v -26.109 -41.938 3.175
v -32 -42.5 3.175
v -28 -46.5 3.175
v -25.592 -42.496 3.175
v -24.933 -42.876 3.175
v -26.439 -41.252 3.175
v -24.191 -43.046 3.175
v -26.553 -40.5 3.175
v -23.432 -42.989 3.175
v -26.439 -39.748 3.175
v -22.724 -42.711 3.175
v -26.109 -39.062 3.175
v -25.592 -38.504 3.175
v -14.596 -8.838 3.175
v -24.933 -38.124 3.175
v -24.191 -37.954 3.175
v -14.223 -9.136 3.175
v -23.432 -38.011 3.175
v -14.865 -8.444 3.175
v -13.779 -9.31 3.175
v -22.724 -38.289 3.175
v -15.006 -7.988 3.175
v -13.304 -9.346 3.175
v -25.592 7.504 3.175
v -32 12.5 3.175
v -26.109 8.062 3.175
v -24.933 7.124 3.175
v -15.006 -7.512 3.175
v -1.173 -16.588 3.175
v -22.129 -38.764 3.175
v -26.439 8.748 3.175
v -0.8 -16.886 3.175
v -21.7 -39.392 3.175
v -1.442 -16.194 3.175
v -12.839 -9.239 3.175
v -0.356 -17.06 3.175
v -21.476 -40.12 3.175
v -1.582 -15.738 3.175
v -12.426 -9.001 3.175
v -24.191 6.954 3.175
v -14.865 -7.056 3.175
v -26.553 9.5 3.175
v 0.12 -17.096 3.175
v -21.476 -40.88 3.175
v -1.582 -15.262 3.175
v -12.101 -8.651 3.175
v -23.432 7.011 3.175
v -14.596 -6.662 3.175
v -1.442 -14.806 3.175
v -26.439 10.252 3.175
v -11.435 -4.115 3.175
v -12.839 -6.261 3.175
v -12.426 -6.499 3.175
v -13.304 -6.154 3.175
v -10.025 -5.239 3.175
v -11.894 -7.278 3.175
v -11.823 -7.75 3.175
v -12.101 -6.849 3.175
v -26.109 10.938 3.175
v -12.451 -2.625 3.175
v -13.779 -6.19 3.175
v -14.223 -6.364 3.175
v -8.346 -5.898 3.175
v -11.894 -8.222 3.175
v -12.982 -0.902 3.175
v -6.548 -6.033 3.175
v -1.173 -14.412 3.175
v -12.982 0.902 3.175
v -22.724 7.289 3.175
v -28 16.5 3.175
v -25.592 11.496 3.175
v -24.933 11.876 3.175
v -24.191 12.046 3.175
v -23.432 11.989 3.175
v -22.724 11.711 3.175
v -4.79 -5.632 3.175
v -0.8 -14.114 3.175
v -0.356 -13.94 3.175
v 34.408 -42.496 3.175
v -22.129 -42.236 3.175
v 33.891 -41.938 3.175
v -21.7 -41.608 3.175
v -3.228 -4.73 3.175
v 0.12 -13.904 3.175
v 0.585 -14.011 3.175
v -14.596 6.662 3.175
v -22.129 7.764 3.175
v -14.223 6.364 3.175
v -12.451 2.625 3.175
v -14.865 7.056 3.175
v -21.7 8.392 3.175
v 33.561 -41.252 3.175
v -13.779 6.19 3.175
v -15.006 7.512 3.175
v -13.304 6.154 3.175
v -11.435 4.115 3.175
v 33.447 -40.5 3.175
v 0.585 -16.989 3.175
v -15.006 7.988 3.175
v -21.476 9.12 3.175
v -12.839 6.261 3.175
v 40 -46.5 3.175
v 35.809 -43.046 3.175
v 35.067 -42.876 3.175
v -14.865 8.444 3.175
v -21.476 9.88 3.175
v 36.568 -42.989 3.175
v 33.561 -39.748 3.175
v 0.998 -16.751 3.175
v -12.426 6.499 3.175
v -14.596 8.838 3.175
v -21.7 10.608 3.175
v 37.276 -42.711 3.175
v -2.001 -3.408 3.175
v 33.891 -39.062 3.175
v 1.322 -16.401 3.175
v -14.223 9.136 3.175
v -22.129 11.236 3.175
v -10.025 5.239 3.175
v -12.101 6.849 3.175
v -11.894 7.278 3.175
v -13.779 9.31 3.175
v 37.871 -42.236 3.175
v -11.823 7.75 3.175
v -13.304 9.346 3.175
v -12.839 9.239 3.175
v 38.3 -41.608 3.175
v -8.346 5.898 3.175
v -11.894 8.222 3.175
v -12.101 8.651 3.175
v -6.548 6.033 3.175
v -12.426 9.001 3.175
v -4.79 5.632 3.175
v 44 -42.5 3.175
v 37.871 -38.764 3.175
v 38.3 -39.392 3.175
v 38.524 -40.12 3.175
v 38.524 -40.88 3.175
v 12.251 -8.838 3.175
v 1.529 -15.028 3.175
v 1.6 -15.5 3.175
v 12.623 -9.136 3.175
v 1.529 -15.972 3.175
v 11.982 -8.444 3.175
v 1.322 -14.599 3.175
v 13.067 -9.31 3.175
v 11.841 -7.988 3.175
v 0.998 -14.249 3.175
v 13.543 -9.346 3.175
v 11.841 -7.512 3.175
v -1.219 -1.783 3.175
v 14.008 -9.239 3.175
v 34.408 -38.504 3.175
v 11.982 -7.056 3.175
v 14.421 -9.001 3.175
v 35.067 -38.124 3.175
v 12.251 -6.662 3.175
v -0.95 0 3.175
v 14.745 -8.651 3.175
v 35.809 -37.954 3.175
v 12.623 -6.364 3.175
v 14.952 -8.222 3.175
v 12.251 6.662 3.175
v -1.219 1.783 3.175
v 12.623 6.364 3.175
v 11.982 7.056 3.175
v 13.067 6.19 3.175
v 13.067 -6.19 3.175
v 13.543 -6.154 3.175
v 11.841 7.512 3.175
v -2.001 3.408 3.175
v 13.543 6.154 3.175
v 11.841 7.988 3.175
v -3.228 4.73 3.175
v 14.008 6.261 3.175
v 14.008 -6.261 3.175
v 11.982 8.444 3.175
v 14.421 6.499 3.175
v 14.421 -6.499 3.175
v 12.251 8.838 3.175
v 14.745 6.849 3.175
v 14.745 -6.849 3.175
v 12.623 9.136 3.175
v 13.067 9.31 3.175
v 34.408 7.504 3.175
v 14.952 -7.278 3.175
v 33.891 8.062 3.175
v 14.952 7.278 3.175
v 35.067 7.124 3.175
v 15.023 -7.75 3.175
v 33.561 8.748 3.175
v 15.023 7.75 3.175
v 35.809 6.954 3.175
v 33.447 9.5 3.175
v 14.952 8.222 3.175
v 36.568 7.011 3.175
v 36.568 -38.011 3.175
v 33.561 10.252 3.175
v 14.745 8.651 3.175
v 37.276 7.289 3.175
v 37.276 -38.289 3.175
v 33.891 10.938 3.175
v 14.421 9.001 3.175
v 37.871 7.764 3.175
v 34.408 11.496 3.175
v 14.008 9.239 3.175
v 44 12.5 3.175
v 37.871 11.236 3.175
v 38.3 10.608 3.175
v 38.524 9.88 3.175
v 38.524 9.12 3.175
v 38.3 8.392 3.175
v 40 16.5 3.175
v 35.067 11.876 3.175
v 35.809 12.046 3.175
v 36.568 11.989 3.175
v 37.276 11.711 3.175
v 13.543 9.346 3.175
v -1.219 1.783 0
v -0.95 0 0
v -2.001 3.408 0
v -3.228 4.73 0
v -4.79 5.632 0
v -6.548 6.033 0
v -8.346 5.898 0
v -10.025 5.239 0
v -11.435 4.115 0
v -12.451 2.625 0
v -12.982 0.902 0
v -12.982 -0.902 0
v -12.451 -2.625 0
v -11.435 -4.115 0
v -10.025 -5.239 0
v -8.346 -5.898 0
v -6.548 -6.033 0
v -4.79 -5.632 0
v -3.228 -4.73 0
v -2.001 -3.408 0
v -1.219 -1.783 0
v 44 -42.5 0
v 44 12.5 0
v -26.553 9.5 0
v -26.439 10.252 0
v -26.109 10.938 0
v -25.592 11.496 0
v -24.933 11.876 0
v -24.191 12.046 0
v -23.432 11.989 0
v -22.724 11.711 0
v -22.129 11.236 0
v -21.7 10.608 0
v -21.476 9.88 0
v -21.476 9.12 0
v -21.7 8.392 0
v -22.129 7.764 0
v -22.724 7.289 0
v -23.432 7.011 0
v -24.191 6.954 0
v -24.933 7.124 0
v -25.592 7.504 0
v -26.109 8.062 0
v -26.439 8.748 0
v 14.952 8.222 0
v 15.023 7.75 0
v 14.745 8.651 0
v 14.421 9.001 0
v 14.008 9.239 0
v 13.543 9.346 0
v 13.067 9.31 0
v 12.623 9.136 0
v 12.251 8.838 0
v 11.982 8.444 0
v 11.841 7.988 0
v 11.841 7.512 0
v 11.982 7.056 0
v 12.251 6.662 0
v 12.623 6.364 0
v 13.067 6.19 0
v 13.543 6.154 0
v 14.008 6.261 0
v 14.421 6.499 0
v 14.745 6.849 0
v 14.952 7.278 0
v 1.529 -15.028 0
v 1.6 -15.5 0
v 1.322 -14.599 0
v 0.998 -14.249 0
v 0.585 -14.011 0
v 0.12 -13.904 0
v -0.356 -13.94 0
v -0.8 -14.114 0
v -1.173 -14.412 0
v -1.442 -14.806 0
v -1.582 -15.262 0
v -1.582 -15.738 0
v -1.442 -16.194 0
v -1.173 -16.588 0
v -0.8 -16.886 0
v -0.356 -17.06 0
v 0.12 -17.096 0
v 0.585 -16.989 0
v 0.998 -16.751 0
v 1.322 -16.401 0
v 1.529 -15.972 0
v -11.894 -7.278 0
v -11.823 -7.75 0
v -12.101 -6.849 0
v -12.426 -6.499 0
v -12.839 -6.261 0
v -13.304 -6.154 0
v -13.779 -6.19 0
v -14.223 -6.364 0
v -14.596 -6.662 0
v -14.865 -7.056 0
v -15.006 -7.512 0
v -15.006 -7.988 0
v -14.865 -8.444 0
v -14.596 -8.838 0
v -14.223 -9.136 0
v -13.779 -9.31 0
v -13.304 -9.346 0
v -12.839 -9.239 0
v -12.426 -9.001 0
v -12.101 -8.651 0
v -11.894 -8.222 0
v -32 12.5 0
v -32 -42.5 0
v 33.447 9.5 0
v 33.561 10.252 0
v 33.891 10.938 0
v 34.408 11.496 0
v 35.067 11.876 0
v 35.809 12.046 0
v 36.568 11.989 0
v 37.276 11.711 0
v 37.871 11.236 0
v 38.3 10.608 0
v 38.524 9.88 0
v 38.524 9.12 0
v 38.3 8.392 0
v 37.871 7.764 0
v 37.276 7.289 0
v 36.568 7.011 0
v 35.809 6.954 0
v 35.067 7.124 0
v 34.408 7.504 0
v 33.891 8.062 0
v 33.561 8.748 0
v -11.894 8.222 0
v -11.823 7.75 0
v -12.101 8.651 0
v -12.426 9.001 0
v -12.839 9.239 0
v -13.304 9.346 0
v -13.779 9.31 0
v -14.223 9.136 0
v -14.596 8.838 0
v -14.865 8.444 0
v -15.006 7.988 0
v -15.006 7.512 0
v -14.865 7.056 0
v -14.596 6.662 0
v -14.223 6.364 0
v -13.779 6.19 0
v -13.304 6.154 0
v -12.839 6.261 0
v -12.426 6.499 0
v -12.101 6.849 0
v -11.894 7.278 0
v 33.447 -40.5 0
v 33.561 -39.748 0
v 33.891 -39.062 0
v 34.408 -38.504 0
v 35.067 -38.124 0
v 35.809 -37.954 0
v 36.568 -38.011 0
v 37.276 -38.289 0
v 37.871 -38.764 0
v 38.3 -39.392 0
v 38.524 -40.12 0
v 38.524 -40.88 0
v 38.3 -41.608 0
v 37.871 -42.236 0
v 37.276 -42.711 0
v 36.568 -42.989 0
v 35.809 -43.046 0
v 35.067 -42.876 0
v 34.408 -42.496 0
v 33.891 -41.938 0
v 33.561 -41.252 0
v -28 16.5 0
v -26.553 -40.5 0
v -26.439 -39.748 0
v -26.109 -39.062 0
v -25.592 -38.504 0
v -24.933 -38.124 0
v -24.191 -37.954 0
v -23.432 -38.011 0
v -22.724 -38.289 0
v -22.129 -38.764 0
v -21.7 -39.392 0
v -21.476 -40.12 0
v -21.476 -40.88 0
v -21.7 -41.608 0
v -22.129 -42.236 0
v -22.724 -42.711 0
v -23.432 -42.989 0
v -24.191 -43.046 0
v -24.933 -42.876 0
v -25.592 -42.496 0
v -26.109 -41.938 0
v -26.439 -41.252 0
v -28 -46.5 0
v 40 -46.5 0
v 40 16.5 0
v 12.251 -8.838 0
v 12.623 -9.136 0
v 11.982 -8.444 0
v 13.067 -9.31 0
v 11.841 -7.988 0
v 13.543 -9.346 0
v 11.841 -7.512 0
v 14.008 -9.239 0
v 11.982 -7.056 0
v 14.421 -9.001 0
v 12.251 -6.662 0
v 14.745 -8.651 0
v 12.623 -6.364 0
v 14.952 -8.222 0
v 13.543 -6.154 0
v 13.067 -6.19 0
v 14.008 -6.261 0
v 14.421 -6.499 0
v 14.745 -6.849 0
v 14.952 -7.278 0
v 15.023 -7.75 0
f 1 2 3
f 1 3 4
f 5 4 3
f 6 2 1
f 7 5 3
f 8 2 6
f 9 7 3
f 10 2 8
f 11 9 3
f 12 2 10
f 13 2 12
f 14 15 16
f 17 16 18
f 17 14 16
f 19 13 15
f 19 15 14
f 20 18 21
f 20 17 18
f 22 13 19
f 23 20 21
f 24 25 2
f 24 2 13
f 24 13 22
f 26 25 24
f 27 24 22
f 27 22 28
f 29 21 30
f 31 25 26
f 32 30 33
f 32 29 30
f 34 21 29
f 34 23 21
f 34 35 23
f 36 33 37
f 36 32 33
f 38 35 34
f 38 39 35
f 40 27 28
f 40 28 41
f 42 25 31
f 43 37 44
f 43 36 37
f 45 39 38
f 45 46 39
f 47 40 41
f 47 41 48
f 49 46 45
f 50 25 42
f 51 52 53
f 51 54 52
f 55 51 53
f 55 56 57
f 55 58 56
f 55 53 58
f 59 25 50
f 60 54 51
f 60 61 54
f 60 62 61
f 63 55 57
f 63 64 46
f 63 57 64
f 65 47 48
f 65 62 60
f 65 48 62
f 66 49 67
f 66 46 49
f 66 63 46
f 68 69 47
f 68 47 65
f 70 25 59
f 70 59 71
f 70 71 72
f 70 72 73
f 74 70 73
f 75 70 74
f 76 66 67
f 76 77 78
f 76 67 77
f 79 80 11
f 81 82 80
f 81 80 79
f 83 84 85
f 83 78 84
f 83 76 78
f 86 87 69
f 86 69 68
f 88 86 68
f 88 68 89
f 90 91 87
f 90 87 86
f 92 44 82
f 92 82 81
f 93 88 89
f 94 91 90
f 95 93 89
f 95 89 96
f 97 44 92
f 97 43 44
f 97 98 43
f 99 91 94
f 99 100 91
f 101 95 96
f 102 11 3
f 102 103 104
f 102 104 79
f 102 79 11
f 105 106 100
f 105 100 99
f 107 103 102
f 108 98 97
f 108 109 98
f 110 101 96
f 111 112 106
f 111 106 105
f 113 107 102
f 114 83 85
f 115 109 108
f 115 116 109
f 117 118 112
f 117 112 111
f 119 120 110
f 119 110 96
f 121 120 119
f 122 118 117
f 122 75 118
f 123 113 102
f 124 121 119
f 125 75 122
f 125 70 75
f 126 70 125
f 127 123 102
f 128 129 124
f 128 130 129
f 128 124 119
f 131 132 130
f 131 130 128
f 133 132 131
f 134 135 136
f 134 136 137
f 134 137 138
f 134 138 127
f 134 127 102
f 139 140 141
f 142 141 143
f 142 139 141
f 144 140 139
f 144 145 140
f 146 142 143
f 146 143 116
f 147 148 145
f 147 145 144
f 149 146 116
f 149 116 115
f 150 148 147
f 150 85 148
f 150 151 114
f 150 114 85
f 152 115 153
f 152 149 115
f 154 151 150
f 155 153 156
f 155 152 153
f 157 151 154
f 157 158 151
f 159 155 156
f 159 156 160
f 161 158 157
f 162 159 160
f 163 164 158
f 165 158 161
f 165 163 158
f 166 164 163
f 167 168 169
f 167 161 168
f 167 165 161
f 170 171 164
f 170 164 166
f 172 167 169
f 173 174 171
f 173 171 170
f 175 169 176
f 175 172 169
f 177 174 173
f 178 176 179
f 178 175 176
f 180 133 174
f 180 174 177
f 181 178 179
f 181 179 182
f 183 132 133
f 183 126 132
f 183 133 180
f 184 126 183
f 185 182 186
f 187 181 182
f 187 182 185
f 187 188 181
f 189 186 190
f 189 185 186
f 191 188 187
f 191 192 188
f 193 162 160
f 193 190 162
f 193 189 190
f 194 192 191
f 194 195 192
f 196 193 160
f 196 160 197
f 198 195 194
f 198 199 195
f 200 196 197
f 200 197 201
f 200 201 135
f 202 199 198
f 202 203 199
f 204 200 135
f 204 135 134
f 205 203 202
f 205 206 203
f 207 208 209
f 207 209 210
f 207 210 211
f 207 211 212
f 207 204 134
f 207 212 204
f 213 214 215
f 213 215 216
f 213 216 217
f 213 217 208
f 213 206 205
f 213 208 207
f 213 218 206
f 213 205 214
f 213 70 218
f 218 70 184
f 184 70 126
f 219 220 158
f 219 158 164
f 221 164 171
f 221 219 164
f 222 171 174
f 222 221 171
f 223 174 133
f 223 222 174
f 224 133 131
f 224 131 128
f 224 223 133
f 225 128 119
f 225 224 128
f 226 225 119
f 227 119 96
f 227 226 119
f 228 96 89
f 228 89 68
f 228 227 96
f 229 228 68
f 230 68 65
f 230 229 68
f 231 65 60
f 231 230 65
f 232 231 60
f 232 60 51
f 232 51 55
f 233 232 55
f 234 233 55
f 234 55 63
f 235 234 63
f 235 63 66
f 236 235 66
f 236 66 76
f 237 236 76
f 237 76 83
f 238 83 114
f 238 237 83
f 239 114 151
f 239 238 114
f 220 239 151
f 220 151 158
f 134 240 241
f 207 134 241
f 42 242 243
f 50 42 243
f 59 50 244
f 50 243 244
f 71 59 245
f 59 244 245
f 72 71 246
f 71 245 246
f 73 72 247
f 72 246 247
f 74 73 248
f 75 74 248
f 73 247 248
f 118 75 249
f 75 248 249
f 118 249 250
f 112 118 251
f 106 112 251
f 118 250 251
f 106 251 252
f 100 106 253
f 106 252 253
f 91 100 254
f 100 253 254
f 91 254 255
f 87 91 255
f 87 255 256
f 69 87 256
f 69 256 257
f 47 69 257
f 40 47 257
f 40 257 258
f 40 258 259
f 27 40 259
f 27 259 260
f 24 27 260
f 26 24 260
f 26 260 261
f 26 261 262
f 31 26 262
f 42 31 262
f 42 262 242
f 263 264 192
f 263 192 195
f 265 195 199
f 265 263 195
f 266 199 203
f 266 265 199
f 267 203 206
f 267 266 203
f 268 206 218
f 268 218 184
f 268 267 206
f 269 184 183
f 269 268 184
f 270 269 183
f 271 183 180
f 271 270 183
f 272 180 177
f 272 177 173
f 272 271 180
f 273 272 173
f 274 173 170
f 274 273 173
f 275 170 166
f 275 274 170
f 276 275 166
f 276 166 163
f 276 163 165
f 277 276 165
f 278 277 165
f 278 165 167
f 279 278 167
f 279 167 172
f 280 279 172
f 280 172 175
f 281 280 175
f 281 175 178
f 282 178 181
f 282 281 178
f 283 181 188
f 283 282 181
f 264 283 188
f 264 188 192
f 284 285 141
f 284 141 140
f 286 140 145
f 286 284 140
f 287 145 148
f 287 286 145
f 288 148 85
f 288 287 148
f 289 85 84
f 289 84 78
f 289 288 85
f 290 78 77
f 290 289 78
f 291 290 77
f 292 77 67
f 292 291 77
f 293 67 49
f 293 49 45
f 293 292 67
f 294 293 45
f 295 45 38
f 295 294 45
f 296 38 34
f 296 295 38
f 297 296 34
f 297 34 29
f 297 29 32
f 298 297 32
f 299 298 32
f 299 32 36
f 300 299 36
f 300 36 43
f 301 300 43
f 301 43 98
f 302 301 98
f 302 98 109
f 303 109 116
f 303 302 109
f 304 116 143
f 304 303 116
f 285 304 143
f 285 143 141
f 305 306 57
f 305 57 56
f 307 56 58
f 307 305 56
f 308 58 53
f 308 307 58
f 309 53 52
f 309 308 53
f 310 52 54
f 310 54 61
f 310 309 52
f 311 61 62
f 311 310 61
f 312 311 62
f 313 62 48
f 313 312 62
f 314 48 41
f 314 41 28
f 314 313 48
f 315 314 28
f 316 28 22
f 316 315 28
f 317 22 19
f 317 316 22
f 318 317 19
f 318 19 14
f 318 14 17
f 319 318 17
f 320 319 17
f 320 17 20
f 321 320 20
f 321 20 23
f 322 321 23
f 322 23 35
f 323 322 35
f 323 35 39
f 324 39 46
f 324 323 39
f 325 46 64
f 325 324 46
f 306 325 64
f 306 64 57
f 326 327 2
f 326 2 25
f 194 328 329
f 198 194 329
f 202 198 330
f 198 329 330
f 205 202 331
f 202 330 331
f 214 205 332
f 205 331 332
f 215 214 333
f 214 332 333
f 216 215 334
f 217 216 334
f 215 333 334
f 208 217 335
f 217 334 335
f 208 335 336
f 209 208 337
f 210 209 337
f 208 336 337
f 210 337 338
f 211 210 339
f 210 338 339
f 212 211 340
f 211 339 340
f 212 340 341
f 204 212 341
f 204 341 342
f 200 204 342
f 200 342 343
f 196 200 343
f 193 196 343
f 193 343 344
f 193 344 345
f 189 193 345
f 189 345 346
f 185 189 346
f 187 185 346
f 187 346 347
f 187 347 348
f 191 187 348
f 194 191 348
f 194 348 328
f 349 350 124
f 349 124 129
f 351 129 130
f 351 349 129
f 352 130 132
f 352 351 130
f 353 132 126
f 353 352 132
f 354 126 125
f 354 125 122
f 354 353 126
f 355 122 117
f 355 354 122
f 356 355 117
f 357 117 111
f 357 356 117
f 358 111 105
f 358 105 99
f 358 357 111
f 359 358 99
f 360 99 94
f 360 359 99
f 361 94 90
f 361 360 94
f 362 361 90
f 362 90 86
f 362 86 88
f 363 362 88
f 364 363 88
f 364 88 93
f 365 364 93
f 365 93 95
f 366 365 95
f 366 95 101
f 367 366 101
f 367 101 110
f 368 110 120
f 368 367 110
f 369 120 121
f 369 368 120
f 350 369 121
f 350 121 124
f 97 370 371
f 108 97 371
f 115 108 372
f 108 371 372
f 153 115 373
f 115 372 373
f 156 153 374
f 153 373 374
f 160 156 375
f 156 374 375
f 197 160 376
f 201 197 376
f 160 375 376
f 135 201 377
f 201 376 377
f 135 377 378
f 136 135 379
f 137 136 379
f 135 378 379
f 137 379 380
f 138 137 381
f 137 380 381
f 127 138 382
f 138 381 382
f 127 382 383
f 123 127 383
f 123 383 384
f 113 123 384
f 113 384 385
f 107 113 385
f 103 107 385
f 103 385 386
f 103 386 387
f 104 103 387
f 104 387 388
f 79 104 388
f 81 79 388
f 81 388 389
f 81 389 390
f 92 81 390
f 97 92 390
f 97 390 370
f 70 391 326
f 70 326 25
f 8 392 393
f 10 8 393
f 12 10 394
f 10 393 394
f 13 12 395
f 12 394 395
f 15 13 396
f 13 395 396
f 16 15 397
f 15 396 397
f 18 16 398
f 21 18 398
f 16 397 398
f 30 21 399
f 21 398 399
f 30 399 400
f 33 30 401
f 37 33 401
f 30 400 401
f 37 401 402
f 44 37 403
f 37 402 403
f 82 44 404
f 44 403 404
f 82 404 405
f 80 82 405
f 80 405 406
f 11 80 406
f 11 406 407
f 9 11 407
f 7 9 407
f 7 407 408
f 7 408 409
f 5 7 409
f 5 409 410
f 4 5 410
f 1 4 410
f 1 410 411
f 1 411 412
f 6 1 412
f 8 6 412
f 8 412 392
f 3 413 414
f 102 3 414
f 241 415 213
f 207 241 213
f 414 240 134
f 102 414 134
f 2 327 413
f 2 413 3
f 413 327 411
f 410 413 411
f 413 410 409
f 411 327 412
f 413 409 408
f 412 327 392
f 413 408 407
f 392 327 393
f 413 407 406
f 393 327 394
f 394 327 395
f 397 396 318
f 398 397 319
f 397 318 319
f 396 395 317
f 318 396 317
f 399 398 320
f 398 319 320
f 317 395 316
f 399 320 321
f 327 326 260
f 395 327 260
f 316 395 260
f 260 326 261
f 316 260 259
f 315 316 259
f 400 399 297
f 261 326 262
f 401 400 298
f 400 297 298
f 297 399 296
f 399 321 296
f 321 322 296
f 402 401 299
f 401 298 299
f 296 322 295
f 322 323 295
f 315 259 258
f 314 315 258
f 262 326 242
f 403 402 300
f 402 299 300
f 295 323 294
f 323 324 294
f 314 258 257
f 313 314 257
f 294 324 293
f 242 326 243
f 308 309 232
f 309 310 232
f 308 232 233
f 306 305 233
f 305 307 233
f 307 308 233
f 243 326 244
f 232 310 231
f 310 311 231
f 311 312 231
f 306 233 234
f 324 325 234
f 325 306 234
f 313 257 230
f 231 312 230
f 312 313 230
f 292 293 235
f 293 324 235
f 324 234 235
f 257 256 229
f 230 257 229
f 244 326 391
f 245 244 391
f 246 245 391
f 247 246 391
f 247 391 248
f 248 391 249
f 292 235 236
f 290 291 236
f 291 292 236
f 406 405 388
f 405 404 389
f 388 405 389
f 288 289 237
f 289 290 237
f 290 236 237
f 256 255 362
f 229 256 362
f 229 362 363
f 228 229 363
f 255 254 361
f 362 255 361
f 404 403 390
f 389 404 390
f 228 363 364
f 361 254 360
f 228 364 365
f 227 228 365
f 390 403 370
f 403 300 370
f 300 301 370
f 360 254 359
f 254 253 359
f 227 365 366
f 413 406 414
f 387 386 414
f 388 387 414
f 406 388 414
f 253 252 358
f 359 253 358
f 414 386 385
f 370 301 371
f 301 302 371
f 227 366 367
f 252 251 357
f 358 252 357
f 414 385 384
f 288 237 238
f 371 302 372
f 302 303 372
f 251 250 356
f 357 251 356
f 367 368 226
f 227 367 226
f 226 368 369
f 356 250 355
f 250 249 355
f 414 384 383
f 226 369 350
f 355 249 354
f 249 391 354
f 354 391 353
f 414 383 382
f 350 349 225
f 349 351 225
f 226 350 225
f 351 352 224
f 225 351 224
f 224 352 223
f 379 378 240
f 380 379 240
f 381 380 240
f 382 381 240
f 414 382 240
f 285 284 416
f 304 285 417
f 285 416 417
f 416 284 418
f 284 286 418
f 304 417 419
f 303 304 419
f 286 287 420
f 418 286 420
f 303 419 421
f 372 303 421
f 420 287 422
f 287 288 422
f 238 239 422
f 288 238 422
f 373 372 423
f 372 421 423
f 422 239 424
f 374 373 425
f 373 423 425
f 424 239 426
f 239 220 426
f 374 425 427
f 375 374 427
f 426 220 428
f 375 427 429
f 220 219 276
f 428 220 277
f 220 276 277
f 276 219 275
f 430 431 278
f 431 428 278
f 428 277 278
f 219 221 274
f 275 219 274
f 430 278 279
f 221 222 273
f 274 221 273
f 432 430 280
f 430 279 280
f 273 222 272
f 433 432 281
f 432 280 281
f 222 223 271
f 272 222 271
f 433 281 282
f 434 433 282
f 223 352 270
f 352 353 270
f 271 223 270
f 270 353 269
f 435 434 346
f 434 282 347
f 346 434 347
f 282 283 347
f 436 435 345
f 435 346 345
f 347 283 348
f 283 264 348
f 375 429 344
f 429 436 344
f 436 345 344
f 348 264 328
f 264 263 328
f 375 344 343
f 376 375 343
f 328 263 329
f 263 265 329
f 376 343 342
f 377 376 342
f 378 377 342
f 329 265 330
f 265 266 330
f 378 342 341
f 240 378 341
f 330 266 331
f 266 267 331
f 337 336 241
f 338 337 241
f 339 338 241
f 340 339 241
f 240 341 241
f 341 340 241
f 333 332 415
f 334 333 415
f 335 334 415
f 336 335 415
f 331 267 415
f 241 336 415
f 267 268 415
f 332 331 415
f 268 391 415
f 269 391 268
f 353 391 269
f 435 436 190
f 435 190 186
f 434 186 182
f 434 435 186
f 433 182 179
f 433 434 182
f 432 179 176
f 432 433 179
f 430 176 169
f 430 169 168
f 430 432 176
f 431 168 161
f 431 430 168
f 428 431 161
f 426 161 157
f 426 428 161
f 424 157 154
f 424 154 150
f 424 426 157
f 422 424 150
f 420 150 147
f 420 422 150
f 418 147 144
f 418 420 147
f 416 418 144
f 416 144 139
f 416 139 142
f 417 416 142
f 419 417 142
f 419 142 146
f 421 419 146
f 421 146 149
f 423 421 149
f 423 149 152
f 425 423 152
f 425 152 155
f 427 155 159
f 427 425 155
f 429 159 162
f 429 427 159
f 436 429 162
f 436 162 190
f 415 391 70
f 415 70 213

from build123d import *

# Parameters (mm, degrees)
SKETCH1_W               = 76
SKETCH1_H               = 63
SKETCH1_R               = 6.05
SKETCH1_R_2             = 1.6
BOSS_EXTRUDE1_DEPTH     = 3.175
CHAMFER1_SIZE           = 4
F_1_4_20_TAPPED_HOLE1_D = 5.1054


with BuildPart() as part:
    # Sketch1 → Boss-Extrude1 (new body)
    with BuildSketch(Plane.XY):
        with Locations((6, -14.99999999)):
            Rectangle(SKETCH1_W, SKETCH1_H)
        with Locations((-7, 0)):
            Circle(SKETCH1_R, mode=Mode.SUBTRACT)
        with Locations((-13.423393759, 7.75)):
            Circle(SKETCH1_R_2, mode=Mode.SUBTRACT)
        with Locations((-13.423393759, -7.75)):
            Circle(SKETCH1_R_2, mode=Mode.SUBTRACT)
        with Locations((0, -15.5)):
            Circle(SKETCH1_R_2, mode=Mode.SUBTRACT)
        with Locations((13.423393759, -7.75)):
            Circle(SKETCH1_R_2, mode=Mode.SUBTRACT)
        with Locations((13.423393759, 7.75)):
            Circle(SKETCH1_R_2, mode=Mode.SUBTRACT)
    extrude(amount=BOSS_EXTRUDE1_DEPTH)

    # Chamfer1
    chamfer1_edges = [part.edges().sort_by_distance(p)[0] for p in [
        (-32, 16.50000001, 1.5875),
        (44, 16.50000001, 1.5875),
        (44, -46.49999999, 1.5875),
        (-32, -46.49999999, 1.5875),
    ]]
    chamfer(chamfer1_edges, length=CHAMFER1_SIZE)

    # 1/4-20 Tapped Hole1 (through all)
    with Locations(Plane.XY.offset(3.175)):
        with Locations((-24, 9.50000001), (36, 9.50000001), (36, -40.49999999), (-24, -40.49999999)):
            Hole(F_1_4_20_TAPPED_HOLE1_D / 2)


solid = part.part
